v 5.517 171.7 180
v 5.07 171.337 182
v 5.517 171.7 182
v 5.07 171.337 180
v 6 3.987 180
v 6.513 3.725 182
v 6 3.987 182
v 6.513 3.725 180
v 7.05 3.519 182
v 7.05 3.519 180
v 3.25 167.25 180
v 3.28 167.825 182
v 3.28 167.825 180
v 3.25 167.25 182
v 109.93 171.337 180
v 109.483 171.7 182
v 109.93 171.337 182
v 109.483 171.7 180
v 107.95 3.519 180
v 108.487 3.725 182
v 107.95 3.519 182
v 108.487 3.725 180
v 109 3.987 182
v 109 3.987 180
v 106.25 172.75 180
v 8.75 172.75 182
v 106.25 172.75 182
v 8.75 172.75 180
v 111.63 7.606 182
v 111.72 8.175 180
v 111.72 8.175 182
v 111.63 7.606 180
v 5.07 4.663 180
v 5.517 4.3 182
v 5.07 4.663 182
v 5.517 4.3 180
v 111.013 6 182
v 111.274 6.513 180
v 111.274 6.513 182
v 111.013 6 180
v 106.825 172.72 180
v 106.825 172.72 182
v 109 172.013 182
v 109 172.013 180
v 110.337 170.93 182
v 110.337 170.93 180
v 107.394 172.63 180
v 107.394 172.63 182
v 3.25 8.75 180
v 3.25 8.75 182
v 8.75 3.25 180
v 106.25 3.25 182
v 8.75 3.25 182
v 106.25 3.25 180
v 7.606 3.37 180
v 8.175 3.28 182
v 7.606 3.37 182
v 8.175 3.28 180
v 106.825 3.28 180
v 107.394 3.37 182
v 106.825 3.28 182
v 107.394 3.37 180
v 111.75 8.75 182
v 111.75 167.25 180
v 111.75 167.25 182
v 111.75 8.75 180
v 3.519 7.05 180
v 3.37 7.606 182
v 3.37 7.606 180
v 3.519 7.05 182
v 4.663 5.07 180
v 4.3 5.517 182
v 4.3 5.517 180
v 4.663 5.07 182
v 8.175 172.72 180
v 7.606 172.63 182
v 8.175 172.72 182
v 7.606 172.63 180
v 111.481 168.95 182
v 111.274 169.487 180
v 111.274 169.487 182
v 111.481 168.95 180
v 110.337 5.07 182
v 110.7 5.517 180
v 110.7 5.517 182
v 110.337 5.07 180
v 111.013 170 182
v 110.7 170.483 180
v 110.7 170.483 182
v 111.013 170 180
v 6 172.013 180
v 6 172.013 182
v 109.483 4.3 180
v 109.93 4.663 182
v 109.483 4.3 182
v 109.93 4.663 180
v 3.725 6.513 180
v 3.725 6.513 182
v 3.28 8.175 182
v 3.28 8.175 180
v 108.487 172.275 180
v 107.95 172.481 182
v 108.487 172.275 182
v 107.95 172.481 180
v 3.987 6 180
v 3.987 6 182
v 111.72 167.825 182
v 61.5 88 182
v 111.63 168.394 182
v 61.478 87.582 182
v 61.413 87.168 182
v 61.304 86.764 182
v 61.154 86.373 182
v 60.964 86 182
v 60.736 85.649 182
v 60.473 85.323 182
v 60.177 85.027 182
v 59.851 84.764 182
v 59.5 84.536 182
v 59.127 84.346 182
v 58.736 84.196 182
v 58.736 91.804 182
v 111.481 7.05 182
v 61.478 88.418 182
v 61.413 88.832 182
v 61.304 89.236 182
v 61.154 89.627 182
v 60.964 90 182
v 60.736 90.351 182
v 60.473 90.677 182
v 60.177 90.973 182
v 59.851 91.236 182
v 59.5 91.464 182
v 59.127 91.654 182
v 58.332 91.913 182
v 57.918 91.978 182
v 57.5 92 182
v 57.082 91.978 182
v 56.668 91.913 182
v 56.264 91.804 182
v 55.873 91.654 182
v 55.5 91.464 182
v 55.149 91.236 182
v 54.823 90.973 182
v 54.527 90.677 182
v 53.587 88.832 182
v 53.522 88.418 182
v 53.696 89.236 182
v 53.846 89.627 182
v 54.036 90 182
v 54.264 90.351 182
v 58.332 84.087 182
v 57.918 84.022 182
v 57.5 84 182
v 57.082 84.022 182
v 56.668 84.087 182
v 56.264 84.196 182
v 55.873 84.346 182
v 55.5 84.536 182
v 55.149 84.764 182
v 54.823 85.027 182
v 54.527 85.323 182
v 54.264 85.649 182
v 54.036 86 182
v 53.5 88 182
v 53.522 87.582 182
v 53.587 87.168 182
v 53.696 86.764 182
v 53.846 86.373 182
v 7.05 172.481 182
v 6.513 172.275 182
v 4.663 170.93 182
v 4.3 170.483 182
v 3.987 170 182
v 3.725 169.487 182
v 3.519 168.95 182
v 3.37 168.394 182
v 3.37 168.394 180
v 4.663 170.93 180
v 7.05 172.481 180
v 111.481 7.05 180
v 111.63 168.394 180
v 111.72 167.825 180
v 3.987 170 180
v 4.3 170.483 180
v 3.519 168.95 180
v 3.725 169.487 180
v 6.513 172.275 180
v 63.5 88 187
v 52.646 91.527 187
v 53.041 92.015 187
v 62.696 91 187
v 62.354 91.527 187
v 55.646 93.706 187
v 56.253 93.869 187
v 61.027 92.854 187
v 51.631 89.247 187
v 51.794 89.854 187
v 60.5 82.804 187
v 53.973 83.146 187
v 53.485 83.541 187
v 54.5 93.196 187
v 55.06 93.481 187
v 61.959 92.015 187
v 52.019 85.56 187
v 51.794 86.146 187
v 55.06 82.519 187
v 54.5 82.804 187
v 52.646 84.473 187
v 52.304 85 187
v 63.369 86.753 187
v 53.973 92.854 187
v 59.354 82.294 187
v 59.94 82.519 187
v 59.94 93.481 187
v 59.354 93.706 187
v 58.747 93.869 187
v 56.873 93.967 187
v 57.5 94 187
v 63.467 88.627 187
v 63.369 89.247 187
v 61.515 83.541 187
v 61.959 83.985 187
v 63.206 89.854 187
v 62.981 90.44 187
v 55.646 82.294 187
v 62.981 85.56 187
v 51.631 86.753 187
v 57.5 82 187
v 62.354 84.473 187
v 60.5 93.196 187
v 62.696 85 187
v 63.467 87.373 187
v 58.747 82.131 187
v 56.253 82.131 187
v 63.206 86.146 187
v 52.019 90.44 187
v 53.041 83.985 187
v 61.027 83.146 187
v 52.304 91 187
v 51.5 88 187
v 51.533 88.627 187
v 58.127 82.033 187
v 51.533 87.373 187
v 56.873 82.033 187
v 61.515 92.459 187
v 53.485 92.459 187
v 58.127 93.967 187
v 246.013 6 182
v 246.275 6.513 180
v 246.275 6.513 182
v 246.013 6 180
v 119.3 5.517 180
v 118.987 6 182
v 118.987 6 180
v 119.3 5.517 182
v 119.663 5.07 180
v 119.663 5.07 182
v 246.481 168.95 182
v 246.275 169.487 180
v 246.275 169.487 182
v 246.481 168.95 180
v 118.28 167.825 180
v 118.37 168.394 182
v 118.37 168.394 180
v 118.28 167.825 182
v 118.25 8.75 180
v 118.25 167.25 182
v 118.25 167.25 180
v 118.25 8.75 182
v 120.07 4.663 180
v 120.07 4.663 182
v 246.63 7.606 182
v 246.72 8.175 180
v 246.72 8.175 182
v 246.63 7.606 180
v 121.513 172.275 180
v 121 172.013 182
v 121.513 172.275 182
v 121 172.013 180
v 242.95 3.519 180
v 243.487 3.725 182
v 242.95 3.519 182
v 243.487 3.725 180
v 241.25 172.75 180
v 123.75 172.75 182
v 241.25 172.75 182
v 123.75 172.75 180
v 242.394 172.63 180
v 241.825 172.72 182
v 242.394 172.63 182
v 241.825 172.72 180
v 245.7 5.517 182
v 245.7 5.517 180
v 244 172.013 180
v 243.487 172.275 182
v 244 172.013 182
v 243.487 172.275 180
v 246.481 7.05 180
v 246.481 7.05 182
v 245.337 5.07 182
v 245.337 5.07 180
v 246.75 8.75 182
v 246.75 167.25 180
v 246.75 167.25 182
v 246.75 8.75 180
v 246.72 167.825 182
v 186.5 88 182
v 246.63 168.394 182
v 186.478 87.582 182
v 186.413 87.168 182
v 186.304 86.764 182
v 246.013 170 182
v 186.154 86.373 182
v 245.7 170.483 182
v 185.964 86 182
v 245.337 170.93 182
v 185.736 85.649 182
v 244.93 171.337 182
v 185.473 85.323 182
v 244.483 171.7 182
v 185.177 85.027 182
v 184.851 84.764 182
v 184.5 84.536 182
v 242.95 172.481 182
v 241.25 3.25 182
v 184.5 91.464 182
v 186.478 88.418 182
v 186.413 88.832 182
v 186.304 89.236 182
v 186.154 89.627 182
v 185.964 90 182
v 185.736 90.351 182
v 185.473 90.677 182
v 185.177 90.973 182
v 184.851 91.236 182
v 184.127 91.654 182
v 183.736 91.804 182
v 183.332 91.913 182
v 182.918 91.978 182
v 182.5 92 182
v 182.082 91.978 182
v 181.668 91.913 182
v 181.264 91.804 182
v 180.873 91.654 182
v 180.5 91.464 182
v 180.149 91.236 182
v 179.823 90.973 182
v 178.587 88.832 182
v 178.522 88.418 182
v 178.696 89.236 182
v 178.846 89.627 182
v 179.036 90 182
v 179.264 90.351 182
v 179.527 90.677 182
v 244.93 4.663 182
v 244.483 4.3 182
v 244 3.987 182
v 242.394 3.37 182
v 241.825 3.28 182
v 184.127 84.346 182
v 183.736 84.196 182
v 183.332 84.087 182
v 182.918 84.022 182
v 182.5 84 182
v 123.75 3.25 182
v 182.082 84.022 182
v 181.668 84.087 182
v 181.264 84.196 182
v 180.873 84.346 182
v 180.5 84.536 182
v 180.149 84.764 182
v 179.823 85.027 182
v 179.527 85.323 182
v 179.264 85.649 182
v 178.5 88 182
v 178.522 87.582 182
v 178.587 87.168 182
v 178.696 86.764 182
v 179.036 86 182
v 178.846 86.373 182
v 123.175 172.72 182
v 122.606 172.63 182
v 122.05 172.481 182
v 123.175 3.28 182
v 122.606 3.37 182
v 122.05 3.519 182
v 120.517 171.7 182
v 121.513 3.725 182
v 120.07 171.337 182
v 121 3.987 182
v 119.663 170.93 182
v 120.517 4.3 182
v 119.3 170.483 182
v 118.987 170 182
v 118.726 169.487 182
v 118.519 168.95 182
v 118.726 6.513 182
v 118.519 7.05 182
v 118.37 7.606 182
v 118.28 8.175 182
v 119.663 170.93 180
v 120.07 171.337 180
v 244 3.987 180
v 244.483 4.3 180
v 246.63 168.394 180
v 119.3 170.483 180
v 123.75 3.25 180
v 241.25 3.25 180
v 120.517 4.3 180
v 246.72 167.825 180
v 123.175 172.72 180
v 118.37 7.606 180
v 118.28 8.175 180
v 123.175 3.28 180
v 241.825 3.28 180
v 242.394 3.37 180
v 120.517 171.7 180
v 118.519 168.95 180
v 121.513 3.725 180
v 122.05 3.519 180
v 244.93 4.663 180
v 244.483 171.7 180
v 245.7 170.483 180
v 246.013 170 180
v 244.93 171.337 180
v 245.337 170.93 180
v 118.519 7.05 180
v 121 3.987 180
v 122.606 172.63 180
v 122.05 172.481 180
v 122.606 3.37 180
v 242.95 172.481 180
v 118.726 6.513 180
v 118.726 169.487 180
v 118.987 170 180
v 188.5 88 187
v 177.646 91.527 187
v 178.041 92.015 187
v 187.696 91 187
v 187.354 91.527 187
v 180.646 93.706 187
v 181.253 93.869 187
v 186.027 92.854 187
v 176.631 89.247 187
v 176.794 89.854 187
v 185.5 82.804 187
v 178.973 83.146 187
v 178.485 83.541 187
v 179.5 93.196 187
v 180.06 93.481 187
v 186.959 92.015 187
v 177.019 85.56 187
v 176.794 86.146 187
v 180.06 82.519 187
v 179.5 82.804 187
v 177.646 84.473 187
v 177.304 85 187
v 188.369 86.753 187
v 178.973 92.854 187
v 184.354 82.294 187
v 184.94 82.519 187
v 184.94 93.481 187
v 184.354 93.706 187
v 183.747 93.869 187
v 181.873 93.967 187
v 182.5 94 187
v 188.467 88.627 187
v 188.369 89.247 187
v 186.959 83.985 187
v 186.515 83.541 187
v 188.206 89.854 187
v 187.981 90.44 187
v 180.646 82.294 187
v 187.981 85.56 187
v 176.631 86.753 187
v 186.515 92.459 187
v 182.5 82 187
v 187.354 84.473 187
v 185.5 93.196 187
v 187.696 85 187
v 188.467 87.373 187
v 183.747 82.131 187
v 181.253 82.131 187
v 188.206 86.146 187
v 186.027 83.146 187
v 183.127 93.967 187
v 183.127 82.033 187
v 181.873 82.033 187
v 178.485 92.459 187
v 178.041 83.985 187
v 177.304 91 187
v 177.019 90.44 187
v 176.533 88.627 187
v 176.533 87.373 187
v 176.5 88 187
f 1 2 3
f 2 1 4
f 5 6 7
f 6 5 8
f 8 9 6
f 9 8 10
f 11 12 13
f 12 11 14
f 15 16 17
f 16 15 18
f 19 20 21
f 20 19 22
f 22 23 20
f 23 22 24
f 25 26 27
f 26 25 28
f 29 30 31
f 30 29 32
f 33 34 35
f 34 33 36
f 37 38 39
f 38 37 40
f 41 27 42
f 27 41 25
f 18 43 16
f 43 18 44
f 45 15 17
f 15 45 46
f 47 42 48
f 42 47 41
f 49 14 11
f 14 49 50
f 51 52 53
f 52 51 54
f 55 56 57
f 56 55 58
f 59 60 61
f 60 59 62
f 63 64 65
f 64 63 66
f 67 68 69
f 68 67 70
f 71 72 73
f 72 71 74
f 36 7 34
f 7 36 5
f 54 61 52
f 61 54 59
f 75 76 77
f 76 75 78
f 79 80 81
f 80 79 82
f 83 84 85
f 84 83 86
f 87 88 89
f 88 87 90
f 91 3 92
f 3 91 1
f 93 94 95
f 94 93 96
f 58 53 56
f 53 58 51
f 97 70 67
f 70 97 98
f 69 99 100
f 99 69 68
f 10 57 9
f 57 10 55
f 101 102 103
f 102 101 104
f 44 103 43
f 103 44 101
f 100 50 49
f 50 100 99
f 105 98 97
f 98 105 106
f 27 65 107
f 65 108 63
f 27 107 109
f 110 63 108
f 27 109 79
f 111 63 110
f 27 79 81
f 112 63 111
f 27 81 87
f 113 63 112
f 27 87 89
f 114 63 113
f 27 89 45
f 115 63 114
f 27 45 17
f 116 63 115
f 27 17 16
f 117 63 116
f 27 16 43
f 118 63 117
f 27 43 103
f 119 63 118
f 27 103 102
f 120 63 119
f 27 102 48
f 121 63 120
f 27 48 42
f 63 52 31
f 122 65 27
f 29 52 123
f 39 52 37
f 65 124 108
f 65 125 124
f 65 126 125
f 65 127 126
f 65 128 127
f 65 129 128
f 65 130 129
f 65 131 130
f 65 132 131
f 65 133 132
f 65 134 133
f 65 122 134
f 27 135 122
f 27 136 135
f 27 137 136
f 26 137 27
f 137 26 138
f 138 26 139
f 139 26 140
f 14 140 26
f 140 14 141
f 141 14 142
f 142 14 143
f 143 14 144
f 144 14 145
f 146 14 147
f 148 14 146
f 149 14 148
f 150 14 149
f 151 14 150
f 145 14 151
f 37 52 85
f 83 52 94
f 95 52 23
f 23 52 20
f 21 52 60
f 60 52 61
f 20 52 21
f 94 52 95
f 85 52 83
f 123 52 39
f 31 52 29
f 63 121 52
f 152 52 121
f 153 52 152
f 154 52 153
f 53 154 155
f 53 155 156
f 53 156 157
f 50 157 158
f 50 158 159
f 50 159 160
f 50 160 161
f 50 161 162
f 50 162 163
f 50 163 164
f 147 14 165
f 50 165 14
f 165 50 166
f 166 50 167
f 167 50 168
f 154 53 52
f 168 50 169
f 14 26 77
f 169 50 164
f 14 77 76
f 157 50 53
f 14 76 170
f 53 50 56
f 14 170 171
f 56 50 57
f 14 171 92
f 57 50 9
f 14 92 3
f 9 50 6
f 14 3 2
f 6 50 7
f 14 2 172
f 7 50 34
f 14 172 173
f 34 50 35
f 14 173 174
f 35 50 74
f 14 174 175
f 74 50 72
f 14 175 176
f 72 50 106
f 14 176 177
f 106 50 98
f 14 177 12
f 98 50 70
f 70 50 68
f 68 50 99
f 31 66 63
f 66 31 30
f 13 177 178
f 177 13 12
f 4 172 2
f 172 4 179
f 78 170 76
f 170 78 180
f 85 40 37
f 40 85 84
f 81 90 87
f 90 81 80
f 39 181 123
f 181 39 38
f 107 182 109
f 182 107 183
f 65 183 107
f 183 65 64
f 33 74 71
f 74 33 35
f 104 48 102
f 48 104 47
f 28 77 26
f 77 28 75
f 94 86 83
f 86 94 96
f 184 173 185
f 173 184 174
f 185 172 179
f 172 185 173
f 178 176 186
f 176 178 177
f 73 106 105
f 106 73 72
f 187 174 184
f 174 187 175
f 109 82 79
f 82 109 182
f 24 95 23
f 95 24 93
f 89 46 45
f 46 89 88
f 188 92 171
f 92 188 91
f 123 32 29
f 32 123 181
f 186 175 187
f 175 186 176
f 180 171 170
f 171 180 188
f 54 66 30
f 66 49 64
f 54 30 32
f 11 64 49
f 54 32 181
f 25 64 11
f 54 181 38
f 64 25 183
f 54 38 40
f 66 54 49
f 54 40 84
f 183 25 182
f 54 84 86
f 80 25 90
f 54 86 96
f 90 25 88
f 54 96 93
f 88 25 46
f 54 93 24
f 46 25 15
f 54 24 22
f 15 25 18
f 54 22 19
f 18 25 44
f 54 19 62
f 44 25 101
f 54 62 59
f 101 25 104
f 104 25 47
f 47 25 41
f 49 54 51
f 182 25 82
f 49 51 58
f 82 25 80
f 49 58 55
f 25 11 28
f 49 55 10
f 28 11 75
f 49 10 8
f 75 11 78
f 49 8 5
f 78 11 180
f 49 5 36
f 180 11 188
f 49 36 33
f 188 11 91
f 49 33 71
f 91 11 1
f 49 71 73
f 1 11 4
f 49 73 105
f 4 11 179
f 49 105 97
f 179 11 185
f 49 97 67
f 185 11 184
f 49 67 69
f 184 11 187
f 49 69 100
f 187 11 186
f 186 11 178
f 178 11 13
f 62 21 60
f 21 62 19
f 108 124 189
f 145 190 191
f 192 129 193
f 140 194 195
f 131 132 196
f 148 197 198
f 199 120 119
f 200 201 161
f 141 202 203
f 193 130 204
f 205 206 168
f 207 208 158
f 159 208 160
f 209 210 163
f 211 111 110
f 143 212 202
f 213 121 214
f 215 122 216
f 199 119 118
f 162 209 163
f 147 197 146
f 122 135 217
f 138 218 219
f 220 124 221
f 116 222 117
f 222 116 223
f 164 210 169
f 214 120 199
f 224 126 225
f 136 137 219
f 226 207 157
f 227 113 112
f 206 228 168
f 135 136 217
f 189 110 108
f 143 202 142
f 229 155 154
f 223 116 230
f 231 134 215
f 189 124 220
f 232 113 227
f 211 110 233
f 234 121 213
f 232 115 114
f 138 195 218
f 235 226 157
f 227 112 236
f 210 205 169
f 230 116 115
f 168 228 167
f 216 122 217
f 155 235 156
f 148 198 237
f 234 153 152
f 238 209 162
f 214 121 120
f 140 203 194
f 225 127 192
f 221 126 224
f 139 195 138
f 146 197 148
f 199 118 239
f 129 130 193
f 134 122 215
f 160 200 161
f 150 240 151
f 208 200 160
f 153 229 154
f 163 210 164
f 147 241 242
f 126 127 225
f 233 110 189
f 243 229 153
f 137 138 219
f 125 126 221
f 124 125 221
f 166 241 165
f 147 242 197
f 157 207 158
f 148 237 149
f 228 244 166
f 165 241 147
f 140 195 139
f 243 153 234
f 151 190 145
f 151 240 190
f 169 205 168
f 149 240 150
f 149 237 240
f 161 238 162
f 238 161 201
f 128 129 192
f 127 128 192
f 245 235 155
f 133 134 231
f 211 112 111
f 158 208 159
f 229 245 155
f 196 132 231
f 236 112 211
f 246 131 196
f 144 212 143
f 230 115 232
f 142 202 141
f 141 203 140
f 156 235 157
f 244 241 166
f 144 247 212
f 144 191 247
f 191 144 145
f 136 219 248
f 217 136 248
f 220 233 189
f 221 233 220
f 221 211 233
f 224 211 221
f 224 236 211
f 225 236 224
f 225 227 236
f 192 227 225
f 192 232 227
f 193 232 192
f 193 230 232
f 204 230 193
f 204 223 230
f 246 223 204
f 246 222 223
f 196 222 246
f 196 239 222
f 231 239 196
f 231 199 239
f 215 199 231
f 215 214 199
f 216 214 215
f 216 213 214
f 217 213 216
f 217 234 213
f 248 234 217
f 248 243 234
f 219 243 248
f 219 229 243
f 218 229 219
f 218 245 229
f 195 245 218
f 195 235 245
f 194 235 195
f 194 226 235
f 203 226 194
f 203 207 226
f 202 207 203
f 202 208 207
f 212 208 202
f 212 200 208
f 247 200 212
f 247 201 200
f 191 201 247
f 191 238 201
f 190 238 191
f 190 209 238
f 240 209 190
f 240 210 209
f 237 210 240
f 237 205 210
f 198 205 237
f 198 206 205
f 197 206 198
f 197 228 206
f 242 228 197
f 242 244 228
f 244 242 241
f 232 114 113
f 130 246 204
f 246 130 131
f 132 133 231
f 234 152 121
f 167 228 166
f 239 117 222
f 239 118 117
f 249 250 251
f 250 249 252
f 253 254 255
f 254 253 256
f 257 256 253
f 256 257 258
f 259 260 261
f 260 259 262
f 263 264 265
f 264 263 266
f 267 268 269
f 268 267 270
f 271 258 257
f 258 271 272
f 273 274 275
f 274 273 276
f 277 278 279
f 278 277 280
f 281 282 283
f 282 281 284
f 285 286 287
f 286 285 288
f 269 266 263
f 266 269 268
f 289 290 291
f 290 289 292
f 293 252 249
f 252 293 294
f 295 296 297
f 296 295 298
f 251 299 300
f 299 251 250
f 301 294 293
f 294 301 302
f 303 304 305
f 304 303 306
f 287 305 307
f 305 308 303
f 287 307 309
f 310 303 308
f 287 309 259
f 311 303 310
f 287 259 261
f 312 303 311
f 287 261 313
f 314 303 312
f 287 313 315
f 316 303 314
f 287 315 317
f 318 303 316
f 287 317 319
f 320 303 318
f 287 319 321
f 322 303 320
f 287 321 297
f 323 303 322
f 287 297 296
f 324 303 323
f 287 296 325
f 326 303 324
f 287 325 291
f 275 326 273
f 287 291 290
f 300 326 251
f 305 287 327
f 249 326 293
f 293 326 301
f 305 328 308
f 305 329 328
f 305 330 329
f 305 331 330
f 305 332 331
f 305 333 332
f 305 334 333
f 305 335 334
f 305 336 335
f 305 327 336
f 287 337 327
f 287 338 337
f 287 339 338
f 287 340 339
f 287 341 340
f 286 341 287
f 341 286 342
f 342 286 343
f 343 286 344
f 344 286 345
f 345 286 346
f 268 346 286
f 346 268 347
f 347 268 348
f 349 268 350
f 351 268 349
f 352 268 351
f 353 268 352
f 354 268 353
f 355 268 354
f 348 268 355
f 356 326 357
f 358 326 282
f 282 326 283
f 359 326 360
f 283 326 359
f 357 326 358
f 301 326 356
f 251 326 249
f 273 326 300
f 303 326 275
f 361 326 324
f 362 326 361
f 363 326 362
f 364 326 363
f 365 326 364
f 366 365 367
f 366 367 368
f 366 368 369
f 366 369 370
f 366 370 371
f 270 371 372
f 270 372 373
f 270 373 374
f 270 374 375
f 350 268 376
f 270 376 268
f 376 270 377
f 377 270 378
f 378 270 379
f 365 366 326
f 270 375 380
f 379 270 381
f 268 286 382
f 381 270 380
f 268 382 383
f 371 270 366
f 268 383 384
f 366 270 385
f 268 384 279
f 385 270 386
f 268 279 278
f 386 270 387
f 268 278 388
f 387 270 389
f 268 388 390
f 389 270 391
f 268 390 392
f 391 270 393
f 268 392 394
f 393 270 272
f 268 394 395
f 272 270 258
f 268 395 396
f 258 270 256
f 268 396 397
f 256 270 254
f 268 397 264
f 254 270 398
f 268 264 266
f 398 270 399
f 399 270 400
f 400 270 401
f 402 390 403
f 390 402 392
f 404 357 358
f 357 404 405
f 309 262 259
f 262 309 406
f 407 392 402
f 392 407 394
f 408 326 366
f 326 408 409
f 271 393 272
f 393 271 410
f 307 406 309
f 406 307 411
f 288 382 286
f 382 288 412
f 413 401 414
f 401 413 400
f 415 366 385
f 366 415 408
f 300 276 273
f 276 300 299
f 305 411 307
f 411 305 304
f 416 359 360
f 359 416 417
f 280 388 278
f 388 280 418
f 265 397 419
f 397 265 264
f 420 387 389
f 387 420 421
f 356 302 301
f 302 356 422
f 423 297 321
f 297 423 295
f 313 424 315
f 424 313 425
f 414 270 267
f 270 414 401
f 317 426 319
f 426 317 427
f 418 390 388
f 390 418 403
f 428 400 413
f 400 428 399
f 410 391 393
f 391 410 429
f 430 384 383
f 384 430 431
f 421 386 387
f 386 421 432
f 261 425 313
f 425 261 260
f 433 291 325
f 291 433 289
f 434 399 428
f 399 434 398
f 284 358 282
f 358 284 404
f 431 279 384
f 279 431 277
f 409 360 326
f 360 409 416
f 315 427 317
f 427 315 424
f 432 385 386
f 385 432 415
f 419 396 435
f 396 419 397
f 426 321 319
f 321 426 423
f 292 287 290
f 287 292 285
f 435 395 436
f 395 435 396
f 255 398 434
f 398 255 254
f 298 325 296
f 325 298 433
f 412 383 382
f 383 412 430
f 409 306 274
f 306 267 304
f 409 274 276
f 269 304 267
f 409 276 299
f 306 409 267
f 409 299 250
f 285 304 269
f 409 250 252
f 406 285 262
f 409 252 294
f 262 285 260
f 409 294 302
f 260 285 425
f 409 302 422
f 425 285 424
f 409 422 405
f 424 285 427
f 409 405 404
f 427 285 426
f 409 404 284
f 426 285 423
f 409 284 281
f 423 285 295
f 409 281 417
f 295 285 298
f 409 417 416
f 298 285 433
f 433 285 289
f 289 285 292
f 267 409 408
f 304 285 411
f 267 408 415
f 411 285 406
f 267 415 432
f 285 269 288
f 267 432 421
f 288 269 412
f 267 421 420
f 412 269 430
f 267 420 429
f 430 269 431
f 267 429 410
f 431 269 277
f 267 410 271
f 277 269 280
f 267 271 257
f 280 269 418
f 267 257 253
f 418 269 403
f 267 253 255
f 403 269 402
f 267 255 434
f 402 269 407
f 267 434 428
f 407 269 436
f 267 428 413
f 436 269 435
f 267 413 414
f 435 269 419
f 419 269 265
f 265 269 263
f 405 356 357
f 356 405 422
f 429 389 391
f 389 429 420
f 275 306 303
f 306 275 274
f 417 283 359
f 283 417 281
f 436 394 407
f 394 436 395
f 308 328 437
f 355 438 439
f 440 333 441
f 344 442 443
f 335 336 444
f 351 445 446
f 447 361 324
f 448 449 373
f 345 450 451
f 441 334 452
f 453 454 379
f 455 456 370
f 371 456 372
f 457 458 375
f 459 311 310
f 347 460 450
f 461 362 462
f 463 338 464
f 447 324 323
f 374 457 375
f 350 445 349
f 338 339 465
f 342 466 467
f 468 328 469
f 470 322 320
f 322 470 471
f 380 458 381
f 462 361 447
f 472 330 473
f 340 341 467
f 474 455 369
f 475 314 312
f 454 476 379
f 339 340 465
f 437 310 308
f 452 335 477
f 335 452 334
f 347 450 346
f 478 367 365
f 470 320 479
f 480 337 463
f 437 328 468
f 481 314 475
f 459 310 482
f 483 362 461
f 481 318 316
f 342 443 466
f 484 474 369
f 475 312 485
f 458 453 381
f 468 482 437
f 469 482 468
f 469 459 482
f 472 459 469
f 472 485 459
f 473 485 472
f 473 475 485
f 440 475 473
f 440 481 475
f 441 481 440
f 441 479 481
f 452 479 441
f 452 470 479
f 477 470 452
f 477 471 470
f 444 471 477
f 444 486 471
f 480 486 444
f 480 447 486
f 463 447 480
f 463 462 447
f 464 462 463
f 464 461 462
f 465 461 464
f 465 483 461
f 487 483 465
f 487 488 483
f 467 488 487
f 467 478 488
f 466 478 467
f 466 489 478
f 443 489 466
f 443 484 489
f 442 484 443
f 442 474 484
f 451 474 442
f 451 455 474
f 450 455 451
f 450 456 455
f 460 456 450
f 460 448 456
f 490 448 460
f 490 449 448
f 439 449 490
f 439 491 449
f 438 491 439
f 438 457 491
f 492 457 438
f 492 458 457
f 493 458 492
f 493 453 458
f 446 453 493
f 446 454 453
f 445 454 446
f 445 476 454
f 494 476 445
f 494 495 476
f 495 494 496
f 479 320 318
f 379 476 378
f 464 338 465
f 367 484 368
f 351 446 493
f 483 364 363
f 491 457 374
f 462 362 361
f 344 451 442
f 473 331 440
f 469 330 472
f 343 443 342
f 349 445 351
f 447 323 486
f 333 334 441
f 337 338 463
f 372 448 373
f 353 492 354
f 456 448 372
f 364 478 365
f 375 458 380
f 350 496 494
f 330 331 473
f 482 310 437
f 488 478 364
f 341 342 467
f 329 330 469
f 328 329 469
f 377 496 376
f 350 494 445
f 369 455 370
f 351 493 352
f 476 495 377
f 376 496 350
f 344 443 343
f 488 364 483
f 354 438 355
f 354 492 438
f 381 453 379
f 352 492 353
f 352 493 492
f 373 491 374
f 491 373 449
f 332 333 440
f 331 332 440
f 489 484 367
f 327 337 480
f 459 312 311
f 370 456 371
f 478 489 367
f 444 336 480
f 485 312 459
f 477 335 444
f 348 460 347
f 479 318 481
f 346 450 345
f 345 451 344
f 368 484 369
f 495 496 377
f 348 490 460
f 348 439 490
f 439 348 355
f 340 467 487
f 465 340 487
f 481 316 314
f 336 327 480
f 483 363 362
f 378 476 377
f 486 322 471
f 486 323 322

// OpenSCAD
// ==============================================================================
// PROGETTO: All-in-One Smart Vase (ESP32 IoT)
// VERSIONE: 1.4.0 (Water Level Sensor Correction)
// ==============================================================================

// --- PARAMETRI GENERALI ---
$fn = 60;
wall_thick = 3.0; 
tolerance = 0.5; 

// --- DIMENSIONI VASO ---
vase_width = 250;
vase_depth = 300;
vase_height = 180;
corner_radius = 10;

// --- DIMENSIONI ELETTRONICA / COMPARTI ANTERIORI ---
oled_width = 24;  
oled_height = 16; 
oled_screen_w = oled_width; 
oled_screen_h = oled_height; 

esp32_bay_depth = 170; 

// --- CONFIGURAZIONE NUOVA: PAVIMENTO ELETTRONICA ---
electronics_floor_z = 80; 

inner_corner_radius = 6;

// --- CONFIGURAZIONE RENDERING ---
show_main_body = 0;
show_drainage_tray = 0;
show_lid = 1; 
show_sensor = 0; 

// ==============================================================================
// LOGICA DI COSTRUZIONE
// ==============================================================================

module lid_generic(w, d) {
    lid_h = 2;
    lid_r = max(1, inner_corner_radius - tolerance); 
    
    union() {
        rounded_cube([w, d, lid_h], lid_r);
        translate([w/2, d/2, lid_h])
            cylinder(h=5, r1=4, r2=6);
    }
}

module rounded_cube(size, r) {
    hull() {
        translate([r, r, 0]) cylinder(h=size[2], r=r);
        translate([size[0]-r, r, 0]) cylinder(h=size[2], r=r);
        translate([size[0]-r, size[1]-r, 0]) cylinder(h=size[2], r=r);
        translate([r, size[1]-r, 0]) cylinder(h=size[2], r=r);
    }
}

module smart_vase_final() {
    
    water_tank_width = (vase_width / 2) - wall_thick;
    electronics_width = (vase_width / 2) - wall_thick;
    
    front_compartment_depth = esp32_bay_depth; 
    
    soil_depth = vase_depth - front_compartment_depth - (wall_thick * 3);
    tray_height = 20;
    floor_z = tray_height + wall_thick + 2; 

    difference() {
        // --- POSITIVO: Guscio Esterno ---
        rounded_cube([vase_width, vase_depth, vase_height], corner_radius);

        // --- NEGATIVO: Comparto SUOLO (A) ---
        translate([wall_thick, front_compartment_depth + wall_thick*2, floor_z])
            rounded_cube([
                vase_width - wall_thick*2, 
                soil_depth, 
                vase_height 
            ], 5);

        // --- NEGATIVO: Comparto ACQUA (B) ---
        translate([wall_thick, wall_thick, floor_z])
            rounded_cube([
                water_tank_width - wall_thick - 10, 
                front_compartment_depth, 
                vase_height
            ], inner_corner_radius);

        // --- NEGATIVO: Comparto ELETTRONICA (C) ---
        translate([water_tank_width + wall_thick*2 - 10, wall_thick, electronics_floor_z])
            rounded_cube([
                electronics_width - wall_thick + 10, 
                front_compartment_depth,
                vase_height
            ], inner_corner_radius);

        // --- NEGATIVO: Vano Vassoio Drenaggio (D) ---
        translate([wall_thick, front_compartment_depth + wall_thick*2, wall_thick])
            rounded_cube([
                vase_width - wall_thick*2, 
                soil_depth + 20, 
                tray_height
            ], inner_corner_radius);
            
        // --- DETTAGLI FUNZIONALI ---
        
        // 1. Fori di drenaggio
		/*
        for(x = [20 : 20 : vase_width-20]) {
            for(y = [front_compartment_depth + 30 : 20 : vase_depth-20]) {
                translate([x, y, floor_z - 5])
                    cylinder(h=10, r=2.5); 
            }
        }
		*/

        // 2. Finestra OLED
        translate([water_tank_width + wall_thick*2 + (electronics_width/2), -1, vase_height - 40]) {
            cube([oled_screen_w, 10, oled_screen_h], center=true);
            translate([0, 3, 0])
                cube([oled_width, 5, oled_height], center=true);
        }
        
        // 3. Passaggi Cavi
        // Elettronica -> Suolo
        translate([water_tank_width + wall_thick*2 + (electronics_width/2) - 15, front_compartment_depth - 5, vase_height - 25])
            rotate([-90, 0, 0]) 
            cylinder(h=25, r=10); 

        // Elettronica -> Acqua (Sensore Livello / Pompa)
        // Questo foro collega la parte alta del serbatoio con la parte alta dell'elettronica
        translate([water_tank_width + wall_thick*1.5, front_compartment_depth/2, vase_height - 20])
            rotate([0, 90, 0])
            cylinder(h=wall_thick*4+20, r=10, center=true);
            
        // 4. Foro USB 
        translate([vase_width - 10, front_compartment_depth/2, electronics_floor_z + 15])
            rotate([0, 90, 0])
            cylinder(h=20, r=10); 
            
        // 5. Foro Tubo Acqua
        translate([water_tank_width + wall_thick*2 + (electronics_width/2) + 15, front_compartment_depth - 5, vase_height - 25])
            rotate([-90, 0, 0])
            cylinder(h=25, r=10);
    }
}

module drainage_tray() {
    front_compartment_depth = esp32_bay_depth; 
    
    tray_w = vase_width - wall_thick*2 - tolerance;
    soil_depth_actual = vase_depth - front_compartment_depth - (wall_thick * 2); 
    tray_d = soil_depth_actual - 5; 
    tray_h = 20 - tolerance; 

    difference() {
        cube([tray_w, tray_d, tray_h]);
        translate([wall_thick, wall_thick, wall_thick])
            cube([tray_w - wall_thick*2, tray_d - wall_thick*2, tray_h + 10]);
    }
    
    translate([tray_w/2, 0, tray_h/2]) {
        difference() {
            union() {
                translate([0, -2, 0]) cube([30, 4, tray_h], center=true);
                rotate([90,0,0]) cylinder(h=2, r=8);
            }
            rotate([90,0,0]) cylinder(h=10, r=4, center=true);
        }
    }
}

module electronics_lid() {
    water_tank_width = (vase_width / 2) - wall_thick;
    electronics_width = (vase_width / 2) - wall_thick;
    front_compartment_depth = esp32_bay_depth; 
    
    cube([electronics_width - wall_thick - tolerance, front_compartment_depth - tolerance, 2]);
}

module us_support() {
    // Dimensioni standard HC-SR04 approssimative
    us_pcb_w = 45; 
    us_pcb_h = 20;
    
    holder_w = esp32_bay_depth;
    holder_d = 10; 
    holder_h = 40; // Leggermente più compatto
    
    holes_radius = 8.2;
	
	rotate([90, 0, 90]) {
		translate([-72, 30, -20]) {
			translate([0, -10, holder_h - 5]) {
				cube([esp32_bay_depth, 10, 5]);
			}

			difference() {
				// Corpo principale
				cube([holder_w, holder_d, holder_h]);
				
				// Scasso PCB
				translate([(holder_w - us_pcb_w)/2, 2, (holder_h - us_pcb_h)/2 + 2])
					cube([us_pcb_w, holder_d, us_pcb_h]);
					
				// Fori occhi (passanti)
				translate([holder_w/2, -1, (holder_h/2)]) {
					translate([-13, 0, 0]) rotate([-90,0,0]) cylinder(h=holder_d+2, r=holes_radius);
					translate([13, 0, 0]) rotate([-90,0,0]) cylinder(h=holder_d+2, r=holes_radius);
				}
			}
		}
	}
}

// ==============================================================================
// GENERAZIONE SCENA
// ==============================================================================

if (show_main_body) {
    color("Teal", 0.8) 
    smart_vase_final();
}

if (show_sensor) {
    // LOGICA DI POSIZIONAMENTO CORRETTA PER LIVELLO ACQUA
    // Deve stare sopra il comparto ACQUA, puntando GIÙ (-Z)
    
    water_tank_w = (vase_width / 2) - wall_thick;
    
    // Posizione X: Centrato nel comparto acqua
    sens_x = wall_thick + (water_tank_w/2) - (55/2); // 55 è width del supporto
    
    // Posizione Y: Centrato in profondità
    sens_y = wall_thick + (esp32_bay_depth/2) - (25/2); // 25 è (ora) height del supporto che diventa profondità ruotato
    
    // Posizione Z: In cima al vaso, appena sotto il bordo
    sens_z = vase_height;

    color("Gold")
    translate([sens_x + 55, sens_y, sens_z - 20]) // Aggiustamenti fini per rotazione
        rotate([0, 180, 0]) // Capovolto a testa in giù (cavi in alto, occhi in basso)
        us_support();
}

if (show_drainage_tray) {
    front_compartment_depth = esp32_bay_depth; 
    color("Silver")
    translate([wall_thick + tolerance/2, front_compartment_depth + wall_thick*2 + 2, wall_thick])
        drainage_tray();
}

if (show_lid) {
    water_tank_width = (vase_width / 2) - wall_thick;
    electronics_width = (vase_width / 2) - wall_thick;
    lid_w_water = water_tank_width - wall_thick - tolerance;
    lid_w_elec = electronics_width - wall_thick - tolerance;
    lid_d = esp32_bay_depth - tolerance;
    
    color("DarkSlateGray") {
        translate([wall_thick + tolerance/2, wall_thick + tolerance/2, vase_height])
            lid_generic(lid_w_water - 10, lid_d);
            
        translate([water_tank_width + wall_thick*2 + tolerance/2 - 10, wall_thick + tolerance/2, vase_height])
            lid_generic(lid_w_elec + 10, lid_d);
    }
}
